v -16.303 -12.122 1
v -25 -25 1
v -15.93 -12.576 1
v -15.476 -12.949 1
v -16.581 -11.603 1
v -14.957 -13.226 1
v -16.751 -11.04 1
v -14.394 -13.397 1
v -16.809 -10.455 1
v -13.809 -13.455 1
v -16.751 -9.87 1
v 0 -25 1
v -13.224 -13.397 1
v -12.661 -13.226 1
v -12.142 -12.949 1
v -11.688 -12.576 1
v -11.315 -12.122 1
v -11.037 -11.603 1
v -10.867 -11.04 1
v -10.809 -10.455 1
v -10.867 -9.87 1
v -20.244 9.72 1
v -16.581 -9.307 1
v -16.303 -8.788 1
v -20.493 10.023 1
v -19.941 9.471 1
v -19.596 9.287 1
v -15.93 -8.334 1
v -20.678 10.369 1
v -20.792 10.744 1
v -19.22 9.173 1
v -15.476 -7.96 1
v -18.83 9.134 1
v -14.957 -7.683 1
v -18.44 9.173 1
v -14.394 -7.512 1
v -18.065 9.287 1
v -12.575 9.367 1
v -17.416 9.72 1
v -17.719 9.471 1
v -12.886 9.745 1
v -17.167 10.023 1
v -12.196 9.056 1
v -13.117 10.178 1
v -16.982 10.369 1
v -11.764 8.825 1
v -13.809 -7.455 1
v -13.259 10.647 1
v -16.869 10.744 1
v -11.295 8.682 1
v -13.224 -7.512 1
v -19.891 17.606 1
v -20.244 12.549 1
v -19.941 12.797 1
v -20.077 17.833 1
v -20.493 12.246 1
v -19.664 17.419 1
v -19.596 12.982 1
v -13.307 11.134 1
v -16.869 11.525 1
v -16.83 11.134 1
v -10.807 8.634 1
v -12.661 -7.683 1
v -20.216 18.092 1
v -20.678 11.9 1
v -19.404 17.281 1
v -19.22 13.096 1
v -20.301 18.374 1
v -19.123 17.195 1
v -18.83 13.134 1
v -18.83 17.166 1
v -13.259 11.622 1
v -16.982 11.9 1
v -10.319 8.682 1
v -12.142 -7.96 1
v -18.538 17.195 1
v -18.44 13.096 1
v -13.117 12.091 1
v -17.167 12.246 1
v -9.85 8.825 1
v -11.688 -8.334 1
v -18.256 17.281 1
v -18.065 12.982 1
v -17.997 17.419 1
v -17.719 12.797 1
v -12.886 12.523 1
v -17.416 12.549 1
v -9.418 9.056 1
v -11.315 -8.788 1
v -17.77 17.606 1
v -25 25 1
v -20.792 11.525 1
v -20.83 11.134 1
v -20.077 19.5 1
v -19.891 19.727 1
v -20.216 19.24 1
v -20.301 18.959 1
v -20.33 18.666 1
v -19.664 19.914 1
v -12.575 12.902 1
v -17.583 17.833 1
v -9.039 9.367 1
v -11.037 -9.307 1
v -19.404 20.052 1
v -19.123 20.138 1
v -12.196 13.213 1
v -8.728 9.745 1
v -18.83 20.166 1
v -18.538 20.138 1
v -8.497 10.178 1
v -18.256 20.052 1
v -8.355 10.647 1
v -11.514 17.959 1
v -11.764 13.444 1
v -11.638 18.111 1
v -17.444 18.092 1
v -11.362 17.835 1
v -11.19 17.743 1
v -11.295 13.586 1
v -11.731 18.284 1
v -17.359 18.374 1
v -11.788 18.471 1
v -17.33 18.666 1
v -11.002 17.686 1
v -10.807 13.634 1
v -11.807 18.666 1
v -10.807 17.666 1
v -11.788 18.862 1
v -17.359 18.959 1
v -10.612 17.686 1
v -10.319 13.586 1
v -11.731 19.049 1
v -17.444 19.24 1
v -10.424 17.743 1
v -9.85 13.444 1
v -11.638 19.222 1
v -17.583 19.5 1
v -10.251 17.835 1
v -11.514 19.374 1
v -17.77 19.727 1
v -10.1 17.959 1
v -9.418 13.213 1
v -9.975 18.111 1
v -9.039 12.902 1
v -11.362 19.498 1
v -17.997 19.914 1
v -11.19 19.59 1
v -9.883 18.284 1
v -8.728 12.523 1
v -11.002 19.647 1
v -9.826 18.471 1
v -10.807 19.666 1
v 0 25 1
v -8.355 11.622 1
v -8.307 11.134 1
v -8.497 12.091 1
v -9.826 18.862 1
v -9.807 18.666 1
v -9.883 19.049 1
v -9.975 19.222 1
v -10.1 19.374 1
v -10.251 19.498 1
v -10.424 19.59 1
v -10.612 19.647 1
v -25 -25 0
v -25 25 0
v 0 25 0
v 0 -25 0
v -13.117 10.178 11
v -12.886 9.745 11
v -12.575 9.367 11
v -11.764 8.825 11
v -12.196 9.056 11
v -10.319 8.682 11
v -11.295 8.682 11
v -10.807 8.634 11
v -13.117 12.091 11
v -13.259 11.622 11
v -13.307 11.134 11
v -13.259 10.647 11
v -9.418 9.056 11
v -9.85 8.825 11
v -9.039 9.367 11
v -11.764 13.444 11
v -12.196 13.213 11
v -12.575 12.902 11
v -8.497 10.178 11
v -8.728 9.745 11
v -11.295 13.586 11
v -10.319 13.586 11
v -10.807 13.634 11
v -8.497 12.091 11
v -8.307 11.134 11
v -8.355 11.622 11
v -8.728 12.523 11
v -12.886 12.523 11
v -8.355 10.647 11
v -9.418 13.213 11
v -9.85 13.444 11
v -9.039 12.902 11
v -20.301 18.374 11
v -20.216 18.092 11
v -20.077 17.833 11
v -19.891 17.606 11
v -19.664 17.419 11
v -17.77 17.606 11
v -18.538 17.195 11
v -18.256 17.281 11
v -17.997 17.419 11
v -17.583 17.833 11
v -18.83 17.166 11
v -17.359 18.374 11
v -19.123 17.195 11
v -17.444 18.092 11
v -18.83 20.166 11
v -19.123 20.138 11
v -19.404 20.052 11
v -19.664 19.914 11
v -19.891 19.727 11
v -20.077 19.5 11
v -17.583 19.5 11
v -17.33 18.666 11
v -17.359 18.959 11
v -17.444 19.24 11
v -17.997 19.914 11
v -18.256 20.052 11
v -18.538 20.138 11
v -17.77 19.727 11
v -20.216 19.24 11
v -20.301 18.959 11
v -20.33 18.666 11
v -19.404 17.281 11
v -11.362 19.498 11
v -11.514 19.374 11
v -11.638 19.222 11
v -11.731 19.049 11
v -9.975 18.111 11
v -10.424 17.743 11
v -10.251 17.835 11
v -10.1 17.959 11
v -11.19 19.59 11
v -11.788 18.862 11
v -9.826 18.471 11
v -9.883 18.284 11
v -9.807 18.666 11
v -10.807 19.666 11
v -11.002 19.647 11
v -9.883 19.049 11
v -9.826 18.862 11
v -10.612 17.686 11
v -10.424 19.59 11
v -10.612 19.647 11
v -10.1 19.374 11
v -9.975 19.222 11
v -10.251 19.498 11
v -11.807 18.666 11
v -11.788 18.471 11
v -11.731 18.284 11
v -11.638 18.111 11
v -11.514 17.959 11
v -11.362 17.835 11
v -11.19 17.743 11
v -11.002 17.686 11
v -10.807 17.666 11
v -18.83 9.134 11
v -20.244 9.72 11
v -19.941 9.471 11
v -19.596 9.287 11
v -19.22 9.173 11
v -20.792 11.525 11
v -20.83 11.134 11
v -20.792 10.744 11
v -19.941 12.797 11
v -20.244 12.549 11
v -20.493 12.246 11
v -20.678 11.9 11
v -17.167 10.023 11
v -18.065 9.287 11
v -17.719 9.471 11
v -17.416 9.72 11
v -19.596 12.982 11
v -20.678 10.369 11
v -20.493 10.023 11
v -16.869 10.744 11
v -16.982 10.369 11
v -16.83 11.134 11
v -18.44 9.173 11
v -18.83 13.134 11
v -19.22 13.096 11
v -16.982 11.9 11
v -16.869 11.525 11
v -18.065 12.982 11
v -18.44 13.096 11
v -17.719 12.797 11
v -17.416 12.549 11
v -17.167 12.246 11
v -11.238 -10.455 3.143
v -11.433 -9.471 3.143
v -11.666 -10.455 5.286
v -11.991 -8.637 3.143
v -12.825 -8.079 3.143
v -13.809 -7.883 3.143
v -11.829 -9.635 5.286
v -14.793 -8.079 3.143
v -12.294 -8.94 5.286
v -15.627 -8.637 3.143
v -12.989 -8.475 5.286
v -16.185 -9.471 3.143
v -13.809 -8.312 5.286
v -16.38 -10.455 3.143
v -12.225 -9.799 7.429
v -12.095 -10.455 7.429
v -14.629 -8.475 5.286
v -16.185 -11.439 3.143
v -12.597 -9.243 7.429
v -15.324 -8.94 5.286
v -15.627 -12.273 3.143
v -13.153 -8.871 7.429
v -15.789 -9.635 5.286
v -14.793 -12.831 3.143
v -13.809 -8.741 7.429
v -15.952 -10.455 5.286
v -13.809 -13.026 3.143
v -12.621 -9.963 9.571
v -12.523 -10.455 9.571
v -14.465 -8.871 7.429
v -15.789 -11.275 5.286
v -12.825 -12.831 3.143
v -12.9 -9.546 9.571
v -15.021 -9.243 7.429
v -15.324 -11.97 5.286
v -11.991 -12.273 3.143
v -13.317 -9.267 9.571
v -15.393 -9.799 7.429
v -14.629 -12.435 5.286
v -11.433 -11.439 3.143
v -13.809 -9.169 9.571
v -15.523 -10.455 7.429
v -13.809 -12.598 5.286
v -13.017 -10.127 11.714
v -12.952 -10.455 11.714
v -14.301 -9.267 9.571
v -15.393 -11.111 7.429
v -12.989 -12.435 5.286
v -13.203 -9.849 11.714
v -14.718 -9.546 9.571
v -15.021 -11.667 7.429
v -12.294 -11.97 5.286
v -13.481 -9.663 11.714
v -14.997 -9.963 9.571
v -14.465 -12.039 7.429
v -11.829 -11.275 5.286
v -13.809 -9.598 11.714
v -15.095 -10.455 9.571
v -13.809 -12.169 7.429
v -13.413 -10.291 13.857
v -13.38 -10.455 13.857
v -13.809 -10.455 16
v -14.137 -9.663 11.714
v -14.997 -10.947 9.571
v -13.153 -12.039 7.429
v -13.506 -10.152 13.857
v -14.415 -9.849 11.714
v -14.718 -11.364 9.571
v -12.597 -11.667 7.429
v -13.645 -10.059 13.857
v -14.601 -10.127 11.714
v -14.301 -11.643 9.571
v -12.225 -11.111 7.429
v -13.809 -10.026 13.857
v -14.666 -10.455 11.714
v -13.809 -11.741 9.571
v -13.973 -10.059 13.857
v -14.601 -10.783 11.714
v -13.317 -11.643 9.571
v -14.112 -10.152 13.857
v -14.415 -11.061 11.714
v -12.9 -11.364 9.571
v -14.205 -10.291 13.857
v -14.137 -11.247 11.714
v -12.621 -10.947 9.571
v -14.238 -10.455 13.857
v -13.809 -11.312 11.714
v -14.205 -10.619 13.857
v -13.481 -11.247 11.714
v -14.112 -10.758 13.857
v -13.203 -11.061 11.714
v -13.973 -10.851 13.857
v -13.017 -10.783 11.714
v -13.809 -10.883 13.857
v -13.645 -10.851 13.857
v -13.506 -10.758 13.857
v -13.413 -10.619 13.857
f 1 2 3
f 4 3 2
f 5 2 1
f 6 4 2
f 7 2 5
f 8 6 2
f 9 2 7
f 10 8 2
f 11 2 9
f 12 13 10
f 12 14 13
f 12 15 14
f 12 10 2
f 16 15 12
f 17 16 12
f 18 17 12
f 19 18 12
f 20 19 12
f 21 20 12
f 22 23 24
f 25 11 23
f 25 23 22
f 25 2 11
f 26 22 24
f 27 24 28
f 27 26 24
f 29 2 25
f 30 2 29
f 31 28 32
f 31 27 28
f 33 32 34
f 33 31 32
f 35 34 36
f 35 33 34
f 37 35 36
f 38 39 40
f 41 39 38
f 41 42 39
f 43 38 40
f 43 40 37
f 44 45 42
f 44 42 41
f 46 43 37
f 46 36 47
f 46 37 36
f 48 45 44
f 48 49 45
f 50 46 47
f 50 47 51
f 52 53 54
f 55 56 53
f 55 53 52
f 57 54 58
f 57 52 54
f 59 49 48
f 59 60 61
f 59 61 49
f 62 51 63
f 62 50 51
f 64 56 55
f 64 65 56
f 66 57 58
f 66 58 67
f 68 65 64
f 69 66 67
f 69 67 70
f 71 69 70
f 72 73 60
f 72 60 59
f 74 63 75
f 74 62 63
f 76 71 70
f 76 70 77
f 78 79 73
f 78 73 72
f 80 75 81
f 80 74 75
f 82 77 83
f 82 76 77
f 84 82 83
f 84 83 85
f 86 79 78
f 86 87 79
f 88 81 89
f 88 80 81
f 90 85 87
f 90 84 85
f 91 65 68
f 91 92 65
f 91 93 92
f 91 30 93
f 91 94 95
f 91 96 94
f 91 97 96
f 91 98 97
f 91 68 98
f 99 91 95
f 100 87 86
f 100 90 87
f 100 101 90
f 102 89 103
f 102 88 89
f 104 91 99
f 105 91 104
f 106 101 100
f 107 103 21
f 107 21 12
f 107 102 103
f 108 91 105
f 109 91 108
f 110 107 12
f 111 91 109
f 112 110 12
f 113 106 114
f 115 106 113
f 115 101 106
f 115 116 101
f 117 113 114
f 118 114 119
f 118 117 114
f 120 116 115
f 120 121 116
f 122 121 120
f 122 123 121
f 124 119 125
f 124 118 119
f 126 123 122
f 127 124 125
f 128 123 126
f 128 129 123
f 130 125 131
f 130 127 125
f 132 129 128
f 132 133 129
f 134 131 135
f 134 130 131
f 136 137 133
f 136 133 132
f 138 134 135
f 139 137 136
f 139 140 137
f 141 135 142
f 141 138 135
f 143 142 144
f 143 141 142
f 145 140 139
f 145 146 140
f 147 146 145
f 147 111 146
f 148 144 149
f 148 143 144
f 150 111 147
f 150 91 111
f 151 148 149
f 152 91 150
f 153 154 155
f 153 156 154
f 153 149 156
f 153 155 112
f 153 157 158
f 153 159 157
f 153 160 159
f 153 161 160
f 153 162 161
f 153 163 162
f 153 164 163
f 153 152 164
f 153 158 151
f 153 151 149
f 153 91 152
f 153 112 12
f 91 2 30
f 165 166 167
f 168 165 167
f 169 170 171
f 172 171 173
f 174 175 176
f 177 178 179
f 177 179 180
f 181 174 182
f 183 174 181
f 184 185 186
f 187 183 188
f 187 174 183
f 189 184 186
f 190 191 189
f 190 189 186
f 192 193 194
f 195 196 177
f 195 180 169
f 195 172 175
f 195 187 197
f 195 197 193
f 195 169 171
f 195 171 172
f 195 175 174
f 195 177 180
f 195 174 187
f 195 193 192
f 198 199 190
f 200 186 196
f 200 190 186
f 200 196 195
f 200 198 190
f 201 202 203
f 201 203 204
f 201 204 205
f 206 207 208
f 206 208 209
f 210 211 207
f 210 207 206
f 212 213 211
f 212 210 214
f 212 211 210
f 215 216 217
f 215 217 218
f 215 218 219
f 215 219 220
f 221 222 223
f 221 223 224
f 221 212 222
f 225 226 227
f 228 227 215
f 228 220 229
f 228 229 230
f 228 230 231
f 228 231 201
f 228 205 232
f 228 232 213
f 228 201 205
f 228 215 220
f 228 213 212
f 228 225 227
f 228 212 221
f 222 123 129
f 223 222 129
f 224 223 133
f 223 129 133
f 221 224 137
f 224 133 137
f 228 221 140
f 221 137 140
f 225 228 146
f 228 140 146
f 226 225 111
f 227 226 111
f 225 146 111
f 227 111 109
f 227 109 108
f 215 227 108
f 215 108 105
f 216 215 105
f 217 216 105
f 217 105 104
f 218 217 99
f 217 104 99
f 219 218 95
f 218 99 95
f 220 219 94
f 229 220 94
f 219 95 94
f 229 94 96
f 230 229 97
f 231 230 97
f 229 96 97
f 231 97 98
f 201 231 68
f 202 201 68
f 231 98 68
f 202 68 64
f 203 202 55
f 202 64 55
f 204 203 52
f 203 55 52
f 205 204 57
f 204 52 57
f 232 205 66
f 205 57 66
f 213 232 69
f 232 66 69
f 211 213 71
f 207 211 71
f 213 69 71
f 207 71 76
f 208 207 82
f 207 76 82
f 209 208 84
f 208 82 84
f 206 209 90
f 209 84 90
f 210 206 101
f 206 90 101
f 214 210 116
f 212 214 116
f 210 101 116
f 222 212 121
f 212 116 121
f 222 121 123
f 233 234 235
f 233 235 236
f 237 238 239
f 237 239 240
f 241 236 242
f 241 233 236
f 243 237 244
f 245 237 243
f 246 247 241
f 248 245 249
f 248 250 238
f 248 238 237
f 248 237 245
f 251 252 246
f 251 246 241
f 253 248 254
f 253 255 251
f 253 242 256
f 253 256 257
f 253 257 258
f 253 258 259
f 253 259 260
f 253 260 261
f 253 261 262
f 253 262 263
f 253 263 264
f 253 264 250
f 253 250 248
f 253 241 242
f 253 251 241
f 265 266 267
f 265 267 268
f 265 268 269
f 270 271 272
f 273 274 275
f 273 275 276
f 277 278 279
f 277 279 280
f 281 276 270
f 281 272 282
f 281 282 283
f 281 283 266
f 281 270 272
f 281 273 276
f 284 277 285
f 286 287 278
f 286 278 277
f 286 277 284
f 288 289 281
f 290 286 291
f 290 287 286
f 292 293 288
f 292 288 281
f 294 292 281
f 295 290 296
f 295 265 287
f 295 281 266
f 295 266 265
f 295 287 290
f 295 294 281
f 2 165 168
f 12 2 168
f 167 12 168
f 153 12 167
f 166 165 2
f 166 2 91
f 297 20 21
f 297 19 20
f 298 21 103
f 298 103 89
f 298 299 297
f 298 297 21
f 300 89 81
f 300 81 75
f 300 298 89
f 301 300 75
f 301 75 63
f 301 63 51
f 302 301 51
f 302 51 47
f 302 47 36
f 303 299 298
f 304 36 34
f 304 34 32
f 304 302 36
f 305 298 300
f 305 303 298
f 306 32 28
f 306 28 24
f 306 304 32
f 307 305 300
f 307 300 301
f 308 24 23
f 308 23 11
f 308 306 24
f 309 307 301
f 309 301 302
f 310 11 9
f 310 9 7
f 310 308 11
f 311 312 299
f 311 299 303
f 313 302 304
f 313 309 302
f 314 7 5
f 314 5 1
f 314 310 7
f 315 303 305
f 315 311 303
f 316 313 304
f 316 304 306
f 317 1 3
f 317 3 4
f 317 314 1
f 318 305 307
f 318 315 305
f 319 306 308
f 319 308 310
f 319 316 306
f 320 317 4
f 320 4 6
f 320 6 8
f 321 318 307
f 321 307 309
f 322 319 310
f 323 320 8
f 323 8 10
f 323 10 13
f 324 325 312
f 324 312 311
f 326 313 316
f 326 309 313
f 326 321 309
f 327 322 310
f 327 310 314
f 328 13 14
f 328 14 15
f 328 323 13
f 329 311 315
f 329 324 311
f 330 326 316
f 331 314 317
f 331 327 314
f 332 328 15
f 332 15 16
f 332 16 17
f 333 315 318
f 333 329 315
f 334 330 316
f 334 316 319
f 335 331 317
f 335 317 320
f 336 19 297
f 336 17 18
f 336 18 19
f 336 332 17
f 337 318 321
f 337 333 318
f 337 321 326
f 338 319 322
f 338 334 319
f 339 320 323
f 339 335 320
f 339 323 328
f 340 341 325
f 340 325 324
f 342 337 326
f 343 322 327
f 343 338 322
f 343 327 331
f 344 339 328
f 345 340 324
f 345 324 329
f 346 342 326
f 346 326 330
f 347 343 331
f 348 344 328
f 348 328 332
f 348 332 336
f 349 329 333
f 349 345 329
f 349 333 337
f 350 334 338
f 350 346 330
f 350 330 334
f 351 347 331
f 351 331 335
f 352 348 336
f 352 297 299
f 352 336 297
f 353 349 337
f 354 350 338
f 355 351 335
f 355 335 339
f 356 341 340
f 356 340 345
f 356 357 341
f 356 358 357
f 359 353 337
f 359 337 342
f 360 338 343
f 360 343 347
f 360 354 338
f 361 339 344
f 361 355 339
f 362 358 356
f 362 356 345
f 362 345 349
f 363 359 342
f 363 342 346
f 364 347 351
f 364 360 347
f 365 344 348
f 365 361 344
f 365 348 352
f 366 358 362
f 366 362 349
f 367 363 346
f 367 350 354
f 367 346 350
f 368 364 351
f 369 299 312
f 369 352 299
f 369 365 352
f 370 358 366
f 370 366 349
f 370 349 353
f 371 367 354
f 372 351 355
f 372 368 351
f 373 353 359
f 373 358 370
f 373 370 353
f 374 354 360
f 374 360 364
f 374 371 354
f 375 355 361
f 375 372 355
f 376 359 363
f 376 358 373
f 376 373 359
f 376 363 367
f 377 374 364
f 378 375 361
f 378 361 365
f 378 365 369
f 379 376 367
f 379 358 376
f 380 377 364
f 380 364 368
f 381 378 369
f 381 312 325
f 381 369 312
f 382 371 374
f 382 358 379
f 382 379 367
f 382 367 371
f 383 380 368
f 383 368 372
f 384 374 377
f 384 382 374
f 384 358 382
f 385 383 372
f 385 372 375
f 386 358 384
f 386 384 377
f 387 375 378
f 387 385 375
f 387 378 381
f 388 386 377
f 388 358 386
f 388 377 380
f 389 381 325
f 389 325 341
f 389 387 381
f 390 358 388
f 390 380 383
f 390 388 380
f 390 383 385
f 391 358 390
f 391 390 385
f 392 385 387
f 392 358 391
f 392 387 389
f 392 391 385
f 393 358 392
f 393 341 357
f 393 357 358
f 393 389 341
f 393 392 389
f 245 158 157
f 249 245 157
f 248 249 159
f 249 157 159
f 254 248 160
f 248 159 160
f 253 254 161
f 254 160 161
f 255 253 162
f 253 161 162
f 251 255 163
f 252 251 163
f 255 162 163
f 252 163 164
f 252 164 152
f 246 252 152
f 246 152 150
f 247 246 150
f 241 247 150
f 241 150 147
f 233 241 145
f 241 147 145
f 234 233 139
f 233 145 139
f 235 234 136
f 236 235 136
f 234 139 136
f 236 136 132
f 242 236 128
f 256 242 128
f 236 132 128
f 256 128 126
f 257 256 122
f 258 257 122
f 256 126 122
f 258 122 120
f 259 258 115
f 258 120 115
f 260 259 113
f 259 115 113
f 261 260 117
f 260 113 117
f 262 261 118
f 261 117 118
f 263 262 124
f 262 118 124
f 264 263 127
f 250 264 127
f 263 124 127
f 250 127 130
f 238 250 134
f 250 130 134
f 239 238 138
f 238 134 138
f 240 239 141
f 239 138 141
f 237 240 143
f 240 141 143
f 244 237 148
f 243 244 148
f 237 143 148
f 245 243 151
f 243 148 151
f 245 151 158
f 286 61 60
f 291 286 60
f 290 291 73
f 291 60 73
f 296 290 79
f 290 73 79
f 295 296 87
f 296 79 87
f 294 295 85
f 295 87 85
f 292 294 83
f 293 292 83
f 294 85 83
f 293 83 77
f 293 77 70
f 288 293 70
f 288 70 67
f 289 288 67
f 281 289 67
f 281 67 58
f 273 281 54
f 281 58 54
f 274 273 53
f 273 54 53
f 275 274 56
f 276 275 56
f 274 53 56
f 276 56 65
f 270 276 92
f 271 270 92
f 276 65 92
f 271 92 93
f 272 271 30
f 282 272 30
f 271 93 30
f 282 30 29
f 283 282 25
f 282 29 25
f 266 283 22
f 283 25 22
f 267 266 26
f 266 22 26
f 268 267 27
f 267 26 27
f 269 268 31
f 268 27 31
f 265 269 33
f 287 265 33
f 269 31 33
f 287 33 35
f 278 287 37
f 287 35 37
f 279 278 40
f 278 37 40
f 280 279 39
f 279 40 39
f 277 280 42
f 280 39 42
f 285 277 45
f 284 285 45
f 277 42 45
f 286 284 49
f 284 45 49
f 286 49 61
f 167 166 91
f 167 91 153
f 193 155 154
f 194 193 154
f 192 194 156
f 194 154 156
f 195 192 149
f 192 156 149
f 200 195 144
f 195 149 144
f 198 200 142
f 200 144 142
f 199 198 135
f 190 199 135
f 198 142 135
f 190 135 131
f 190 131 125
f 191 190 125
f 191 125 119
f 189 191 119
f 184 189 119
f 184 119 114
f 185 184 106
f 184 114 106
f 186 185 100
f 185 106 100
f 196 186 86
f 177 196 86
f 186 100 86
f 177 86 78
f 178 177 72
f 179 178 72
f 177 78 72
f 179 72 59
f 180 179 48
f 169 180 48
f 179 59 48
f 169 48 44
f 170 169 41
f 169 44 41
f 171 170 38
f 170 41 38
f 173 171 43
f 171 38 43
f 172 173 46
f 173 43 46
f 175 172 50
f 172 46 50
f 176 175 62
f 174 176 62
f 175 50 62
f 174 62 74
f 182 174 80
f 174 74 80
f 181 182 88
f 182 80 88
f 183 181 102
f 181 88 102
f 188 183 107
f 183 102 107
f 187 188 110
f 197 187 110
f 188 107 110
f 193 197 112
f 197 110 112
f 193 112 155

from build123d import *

# Parameters (mm, degrees)
F0_W     = 50
F0_H     = 50
F1_DEPTH = 1
F2_R     = 1.5
F2_R_2   = 1
F2_R_3   = 2
F2_R_4   = 2.5
F3_DEPTH = 10
F4_R     = 3
F8_W     = 25
F8_H     = 50
F9_DEPTH = 1


with BuildPart() as f1:
    # F0 (on Top) → F1 (new body)
    with BuildSketch(Plane.XY):
        Rectangle(F0_W, F0_H)
    extrude(amount=F1_DEPTH)

    # F2 (on face) → F3 (join)
    with BuildSketch(Plane.XY.offset(1)):
        with Locations((-18.8301634043, 18.6664275825)):
            Circle(F2_R)
        with Locations((-10.8068743721, 18.6664275825)):
            Circle(F2_R_2)
        with Locations((-18.8301634043, 11.1343609169)):
            Circle(F2_R_3)
        with Locations((-10.8068743721, 11.1343609169)):
            Circle(F2_R_4)
    extrude(amount=F3_DEPTH)

    # F4 (on face) → F7 section 0
    with BuildSketch(Plane.XY.offset(1), mode=Mode.PRIVATE) as f7_s0:
        with Locations((-13.8089349493, -10.4548223317)):
            Circle(F4_R)
    loft([f7_s0.sketch, Vertex(-13.8089349493, -10.4548223317, 16)])

    # F8 (on face) → F9 (cut, through all)
    with BuildSketch(Plane.XY.offset(1)):
        with Locations((12.5, 0)):
            Rectangle(F8_W, F8_H)
    extrude(amount=-F9_DEPTH, mode=Mode.SUBTRACT)


solid = f1.part
